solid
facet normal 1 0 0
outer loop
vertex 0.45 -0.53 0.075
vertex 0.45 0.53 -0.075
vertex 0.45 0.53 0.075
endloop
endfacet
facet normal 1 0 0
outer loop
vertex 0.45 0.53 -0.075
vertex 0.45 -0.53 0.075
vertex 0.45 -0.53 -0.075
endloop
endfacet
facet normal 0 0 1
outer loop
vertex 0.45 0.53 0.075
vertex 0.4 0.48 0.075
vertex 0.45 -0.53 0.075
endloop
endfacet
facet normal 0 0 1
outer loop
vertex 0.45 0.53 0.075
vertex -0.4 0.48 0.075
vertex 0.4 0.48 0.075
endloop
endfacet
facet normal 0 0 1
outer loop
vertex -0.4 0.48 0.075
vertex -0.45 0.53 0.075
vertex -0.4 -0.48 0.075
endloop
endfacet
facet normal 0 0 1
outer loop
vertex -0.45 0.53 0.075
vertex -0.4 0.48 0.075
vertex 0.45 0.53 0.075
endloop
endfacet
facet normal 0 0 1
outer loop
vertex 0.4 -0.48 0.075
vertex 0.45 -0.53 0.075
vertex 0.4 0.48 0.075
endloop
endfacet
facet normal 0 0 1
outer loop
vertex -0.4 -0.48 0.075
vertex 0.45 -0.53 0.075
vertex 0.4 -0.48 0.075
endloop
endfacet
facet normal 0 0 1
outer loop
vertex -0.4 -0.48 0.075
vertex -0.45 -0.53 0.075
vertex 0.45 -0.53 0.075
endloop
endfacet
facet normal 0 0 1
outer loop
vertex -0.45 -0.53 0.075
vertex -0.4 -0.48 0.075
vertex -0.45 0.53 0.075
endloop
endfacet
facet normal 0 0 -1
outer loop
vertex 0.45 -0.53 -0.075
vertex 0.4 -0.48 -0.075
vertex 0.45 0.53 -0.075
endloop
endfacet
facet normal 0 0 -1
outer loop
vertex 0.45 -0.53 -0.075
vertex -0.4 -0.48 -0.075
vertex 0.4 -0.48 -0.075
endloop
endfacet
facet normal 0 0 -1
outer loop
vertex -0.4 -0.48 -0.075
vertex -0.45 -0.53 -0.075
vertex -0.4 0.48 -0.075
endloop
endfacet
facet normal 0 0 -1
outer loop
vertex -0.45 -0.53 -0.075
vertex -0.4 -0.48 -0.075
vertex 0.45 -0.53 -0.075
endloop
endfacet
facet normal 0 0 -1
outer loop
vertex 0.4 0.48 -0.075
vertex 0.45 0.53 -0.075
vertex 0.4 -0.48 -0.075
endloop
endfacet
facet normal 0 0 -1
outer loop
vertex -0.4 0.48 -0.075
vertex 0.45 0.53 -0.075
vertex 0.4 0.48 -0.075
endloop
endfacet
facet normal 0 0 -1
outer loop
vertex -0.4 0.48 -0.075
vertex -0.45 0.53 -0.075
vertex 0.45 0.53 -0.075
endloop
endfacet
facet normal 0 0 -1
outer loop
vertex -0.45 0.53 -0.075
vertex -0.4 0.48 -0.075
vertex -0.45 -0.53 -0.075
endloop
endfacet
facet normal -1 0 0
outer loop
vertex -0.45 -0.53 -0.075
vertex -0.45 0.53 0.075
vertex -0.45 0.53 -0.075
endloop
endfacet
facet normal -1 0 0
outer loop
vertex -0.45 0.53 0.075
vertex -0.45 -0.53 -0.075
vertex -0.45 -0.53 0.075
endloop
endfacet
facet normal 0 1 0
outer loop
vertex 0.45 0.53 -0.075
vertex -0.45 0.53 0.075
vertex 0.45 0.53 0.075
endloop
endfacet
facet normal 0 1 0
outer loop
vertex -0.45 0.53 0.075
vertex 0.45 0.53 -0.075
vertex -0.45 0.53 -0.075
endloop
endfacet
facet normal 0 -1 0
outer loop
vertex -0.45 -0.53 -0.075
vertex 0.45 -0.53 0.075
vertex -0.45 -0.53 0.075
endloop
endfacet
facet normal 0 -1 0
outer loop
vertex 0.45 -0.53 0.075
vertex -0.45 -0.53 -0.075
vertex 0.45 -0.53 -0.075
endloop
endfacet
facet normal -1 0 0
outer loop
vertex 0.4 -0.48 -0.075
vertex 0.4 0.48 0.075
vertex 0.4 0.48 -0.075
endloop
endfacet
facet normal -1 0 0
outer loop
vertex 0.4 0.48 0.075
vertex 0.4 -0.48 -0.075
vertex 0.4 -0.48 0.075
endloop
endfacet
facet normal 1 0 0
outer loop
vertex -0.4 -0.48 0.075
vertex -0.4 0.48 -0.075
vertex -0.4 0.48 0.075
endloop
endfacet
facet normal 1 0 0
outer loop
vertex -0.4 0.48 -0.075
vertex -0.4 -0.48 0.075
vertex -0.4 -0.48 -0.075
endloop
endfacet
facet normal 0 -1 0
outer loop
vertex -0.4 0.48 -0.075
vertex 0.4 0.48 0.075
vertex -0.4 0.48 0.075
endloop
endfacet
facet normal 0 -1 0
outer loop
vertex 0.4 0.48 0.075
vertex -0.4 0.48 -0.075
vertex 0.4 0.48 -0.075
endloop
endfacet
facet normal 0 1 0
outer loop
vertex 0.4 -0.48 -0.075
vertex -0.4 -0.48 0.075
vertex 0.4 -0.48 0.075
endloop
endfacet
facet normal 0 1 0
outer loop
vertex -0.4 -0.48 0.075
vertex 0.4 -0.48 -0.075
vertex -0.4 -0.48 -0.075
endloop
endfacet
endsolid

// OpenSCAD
edges = 1; // set by Makefile
canvas = 1; // set by Makefile

if (edges == 1) {
    difference() {
        cube([0.9, 1.06, 0.15], center = true);
        cube([0.8, 0.96, 0.2], center = true);
    }
}
